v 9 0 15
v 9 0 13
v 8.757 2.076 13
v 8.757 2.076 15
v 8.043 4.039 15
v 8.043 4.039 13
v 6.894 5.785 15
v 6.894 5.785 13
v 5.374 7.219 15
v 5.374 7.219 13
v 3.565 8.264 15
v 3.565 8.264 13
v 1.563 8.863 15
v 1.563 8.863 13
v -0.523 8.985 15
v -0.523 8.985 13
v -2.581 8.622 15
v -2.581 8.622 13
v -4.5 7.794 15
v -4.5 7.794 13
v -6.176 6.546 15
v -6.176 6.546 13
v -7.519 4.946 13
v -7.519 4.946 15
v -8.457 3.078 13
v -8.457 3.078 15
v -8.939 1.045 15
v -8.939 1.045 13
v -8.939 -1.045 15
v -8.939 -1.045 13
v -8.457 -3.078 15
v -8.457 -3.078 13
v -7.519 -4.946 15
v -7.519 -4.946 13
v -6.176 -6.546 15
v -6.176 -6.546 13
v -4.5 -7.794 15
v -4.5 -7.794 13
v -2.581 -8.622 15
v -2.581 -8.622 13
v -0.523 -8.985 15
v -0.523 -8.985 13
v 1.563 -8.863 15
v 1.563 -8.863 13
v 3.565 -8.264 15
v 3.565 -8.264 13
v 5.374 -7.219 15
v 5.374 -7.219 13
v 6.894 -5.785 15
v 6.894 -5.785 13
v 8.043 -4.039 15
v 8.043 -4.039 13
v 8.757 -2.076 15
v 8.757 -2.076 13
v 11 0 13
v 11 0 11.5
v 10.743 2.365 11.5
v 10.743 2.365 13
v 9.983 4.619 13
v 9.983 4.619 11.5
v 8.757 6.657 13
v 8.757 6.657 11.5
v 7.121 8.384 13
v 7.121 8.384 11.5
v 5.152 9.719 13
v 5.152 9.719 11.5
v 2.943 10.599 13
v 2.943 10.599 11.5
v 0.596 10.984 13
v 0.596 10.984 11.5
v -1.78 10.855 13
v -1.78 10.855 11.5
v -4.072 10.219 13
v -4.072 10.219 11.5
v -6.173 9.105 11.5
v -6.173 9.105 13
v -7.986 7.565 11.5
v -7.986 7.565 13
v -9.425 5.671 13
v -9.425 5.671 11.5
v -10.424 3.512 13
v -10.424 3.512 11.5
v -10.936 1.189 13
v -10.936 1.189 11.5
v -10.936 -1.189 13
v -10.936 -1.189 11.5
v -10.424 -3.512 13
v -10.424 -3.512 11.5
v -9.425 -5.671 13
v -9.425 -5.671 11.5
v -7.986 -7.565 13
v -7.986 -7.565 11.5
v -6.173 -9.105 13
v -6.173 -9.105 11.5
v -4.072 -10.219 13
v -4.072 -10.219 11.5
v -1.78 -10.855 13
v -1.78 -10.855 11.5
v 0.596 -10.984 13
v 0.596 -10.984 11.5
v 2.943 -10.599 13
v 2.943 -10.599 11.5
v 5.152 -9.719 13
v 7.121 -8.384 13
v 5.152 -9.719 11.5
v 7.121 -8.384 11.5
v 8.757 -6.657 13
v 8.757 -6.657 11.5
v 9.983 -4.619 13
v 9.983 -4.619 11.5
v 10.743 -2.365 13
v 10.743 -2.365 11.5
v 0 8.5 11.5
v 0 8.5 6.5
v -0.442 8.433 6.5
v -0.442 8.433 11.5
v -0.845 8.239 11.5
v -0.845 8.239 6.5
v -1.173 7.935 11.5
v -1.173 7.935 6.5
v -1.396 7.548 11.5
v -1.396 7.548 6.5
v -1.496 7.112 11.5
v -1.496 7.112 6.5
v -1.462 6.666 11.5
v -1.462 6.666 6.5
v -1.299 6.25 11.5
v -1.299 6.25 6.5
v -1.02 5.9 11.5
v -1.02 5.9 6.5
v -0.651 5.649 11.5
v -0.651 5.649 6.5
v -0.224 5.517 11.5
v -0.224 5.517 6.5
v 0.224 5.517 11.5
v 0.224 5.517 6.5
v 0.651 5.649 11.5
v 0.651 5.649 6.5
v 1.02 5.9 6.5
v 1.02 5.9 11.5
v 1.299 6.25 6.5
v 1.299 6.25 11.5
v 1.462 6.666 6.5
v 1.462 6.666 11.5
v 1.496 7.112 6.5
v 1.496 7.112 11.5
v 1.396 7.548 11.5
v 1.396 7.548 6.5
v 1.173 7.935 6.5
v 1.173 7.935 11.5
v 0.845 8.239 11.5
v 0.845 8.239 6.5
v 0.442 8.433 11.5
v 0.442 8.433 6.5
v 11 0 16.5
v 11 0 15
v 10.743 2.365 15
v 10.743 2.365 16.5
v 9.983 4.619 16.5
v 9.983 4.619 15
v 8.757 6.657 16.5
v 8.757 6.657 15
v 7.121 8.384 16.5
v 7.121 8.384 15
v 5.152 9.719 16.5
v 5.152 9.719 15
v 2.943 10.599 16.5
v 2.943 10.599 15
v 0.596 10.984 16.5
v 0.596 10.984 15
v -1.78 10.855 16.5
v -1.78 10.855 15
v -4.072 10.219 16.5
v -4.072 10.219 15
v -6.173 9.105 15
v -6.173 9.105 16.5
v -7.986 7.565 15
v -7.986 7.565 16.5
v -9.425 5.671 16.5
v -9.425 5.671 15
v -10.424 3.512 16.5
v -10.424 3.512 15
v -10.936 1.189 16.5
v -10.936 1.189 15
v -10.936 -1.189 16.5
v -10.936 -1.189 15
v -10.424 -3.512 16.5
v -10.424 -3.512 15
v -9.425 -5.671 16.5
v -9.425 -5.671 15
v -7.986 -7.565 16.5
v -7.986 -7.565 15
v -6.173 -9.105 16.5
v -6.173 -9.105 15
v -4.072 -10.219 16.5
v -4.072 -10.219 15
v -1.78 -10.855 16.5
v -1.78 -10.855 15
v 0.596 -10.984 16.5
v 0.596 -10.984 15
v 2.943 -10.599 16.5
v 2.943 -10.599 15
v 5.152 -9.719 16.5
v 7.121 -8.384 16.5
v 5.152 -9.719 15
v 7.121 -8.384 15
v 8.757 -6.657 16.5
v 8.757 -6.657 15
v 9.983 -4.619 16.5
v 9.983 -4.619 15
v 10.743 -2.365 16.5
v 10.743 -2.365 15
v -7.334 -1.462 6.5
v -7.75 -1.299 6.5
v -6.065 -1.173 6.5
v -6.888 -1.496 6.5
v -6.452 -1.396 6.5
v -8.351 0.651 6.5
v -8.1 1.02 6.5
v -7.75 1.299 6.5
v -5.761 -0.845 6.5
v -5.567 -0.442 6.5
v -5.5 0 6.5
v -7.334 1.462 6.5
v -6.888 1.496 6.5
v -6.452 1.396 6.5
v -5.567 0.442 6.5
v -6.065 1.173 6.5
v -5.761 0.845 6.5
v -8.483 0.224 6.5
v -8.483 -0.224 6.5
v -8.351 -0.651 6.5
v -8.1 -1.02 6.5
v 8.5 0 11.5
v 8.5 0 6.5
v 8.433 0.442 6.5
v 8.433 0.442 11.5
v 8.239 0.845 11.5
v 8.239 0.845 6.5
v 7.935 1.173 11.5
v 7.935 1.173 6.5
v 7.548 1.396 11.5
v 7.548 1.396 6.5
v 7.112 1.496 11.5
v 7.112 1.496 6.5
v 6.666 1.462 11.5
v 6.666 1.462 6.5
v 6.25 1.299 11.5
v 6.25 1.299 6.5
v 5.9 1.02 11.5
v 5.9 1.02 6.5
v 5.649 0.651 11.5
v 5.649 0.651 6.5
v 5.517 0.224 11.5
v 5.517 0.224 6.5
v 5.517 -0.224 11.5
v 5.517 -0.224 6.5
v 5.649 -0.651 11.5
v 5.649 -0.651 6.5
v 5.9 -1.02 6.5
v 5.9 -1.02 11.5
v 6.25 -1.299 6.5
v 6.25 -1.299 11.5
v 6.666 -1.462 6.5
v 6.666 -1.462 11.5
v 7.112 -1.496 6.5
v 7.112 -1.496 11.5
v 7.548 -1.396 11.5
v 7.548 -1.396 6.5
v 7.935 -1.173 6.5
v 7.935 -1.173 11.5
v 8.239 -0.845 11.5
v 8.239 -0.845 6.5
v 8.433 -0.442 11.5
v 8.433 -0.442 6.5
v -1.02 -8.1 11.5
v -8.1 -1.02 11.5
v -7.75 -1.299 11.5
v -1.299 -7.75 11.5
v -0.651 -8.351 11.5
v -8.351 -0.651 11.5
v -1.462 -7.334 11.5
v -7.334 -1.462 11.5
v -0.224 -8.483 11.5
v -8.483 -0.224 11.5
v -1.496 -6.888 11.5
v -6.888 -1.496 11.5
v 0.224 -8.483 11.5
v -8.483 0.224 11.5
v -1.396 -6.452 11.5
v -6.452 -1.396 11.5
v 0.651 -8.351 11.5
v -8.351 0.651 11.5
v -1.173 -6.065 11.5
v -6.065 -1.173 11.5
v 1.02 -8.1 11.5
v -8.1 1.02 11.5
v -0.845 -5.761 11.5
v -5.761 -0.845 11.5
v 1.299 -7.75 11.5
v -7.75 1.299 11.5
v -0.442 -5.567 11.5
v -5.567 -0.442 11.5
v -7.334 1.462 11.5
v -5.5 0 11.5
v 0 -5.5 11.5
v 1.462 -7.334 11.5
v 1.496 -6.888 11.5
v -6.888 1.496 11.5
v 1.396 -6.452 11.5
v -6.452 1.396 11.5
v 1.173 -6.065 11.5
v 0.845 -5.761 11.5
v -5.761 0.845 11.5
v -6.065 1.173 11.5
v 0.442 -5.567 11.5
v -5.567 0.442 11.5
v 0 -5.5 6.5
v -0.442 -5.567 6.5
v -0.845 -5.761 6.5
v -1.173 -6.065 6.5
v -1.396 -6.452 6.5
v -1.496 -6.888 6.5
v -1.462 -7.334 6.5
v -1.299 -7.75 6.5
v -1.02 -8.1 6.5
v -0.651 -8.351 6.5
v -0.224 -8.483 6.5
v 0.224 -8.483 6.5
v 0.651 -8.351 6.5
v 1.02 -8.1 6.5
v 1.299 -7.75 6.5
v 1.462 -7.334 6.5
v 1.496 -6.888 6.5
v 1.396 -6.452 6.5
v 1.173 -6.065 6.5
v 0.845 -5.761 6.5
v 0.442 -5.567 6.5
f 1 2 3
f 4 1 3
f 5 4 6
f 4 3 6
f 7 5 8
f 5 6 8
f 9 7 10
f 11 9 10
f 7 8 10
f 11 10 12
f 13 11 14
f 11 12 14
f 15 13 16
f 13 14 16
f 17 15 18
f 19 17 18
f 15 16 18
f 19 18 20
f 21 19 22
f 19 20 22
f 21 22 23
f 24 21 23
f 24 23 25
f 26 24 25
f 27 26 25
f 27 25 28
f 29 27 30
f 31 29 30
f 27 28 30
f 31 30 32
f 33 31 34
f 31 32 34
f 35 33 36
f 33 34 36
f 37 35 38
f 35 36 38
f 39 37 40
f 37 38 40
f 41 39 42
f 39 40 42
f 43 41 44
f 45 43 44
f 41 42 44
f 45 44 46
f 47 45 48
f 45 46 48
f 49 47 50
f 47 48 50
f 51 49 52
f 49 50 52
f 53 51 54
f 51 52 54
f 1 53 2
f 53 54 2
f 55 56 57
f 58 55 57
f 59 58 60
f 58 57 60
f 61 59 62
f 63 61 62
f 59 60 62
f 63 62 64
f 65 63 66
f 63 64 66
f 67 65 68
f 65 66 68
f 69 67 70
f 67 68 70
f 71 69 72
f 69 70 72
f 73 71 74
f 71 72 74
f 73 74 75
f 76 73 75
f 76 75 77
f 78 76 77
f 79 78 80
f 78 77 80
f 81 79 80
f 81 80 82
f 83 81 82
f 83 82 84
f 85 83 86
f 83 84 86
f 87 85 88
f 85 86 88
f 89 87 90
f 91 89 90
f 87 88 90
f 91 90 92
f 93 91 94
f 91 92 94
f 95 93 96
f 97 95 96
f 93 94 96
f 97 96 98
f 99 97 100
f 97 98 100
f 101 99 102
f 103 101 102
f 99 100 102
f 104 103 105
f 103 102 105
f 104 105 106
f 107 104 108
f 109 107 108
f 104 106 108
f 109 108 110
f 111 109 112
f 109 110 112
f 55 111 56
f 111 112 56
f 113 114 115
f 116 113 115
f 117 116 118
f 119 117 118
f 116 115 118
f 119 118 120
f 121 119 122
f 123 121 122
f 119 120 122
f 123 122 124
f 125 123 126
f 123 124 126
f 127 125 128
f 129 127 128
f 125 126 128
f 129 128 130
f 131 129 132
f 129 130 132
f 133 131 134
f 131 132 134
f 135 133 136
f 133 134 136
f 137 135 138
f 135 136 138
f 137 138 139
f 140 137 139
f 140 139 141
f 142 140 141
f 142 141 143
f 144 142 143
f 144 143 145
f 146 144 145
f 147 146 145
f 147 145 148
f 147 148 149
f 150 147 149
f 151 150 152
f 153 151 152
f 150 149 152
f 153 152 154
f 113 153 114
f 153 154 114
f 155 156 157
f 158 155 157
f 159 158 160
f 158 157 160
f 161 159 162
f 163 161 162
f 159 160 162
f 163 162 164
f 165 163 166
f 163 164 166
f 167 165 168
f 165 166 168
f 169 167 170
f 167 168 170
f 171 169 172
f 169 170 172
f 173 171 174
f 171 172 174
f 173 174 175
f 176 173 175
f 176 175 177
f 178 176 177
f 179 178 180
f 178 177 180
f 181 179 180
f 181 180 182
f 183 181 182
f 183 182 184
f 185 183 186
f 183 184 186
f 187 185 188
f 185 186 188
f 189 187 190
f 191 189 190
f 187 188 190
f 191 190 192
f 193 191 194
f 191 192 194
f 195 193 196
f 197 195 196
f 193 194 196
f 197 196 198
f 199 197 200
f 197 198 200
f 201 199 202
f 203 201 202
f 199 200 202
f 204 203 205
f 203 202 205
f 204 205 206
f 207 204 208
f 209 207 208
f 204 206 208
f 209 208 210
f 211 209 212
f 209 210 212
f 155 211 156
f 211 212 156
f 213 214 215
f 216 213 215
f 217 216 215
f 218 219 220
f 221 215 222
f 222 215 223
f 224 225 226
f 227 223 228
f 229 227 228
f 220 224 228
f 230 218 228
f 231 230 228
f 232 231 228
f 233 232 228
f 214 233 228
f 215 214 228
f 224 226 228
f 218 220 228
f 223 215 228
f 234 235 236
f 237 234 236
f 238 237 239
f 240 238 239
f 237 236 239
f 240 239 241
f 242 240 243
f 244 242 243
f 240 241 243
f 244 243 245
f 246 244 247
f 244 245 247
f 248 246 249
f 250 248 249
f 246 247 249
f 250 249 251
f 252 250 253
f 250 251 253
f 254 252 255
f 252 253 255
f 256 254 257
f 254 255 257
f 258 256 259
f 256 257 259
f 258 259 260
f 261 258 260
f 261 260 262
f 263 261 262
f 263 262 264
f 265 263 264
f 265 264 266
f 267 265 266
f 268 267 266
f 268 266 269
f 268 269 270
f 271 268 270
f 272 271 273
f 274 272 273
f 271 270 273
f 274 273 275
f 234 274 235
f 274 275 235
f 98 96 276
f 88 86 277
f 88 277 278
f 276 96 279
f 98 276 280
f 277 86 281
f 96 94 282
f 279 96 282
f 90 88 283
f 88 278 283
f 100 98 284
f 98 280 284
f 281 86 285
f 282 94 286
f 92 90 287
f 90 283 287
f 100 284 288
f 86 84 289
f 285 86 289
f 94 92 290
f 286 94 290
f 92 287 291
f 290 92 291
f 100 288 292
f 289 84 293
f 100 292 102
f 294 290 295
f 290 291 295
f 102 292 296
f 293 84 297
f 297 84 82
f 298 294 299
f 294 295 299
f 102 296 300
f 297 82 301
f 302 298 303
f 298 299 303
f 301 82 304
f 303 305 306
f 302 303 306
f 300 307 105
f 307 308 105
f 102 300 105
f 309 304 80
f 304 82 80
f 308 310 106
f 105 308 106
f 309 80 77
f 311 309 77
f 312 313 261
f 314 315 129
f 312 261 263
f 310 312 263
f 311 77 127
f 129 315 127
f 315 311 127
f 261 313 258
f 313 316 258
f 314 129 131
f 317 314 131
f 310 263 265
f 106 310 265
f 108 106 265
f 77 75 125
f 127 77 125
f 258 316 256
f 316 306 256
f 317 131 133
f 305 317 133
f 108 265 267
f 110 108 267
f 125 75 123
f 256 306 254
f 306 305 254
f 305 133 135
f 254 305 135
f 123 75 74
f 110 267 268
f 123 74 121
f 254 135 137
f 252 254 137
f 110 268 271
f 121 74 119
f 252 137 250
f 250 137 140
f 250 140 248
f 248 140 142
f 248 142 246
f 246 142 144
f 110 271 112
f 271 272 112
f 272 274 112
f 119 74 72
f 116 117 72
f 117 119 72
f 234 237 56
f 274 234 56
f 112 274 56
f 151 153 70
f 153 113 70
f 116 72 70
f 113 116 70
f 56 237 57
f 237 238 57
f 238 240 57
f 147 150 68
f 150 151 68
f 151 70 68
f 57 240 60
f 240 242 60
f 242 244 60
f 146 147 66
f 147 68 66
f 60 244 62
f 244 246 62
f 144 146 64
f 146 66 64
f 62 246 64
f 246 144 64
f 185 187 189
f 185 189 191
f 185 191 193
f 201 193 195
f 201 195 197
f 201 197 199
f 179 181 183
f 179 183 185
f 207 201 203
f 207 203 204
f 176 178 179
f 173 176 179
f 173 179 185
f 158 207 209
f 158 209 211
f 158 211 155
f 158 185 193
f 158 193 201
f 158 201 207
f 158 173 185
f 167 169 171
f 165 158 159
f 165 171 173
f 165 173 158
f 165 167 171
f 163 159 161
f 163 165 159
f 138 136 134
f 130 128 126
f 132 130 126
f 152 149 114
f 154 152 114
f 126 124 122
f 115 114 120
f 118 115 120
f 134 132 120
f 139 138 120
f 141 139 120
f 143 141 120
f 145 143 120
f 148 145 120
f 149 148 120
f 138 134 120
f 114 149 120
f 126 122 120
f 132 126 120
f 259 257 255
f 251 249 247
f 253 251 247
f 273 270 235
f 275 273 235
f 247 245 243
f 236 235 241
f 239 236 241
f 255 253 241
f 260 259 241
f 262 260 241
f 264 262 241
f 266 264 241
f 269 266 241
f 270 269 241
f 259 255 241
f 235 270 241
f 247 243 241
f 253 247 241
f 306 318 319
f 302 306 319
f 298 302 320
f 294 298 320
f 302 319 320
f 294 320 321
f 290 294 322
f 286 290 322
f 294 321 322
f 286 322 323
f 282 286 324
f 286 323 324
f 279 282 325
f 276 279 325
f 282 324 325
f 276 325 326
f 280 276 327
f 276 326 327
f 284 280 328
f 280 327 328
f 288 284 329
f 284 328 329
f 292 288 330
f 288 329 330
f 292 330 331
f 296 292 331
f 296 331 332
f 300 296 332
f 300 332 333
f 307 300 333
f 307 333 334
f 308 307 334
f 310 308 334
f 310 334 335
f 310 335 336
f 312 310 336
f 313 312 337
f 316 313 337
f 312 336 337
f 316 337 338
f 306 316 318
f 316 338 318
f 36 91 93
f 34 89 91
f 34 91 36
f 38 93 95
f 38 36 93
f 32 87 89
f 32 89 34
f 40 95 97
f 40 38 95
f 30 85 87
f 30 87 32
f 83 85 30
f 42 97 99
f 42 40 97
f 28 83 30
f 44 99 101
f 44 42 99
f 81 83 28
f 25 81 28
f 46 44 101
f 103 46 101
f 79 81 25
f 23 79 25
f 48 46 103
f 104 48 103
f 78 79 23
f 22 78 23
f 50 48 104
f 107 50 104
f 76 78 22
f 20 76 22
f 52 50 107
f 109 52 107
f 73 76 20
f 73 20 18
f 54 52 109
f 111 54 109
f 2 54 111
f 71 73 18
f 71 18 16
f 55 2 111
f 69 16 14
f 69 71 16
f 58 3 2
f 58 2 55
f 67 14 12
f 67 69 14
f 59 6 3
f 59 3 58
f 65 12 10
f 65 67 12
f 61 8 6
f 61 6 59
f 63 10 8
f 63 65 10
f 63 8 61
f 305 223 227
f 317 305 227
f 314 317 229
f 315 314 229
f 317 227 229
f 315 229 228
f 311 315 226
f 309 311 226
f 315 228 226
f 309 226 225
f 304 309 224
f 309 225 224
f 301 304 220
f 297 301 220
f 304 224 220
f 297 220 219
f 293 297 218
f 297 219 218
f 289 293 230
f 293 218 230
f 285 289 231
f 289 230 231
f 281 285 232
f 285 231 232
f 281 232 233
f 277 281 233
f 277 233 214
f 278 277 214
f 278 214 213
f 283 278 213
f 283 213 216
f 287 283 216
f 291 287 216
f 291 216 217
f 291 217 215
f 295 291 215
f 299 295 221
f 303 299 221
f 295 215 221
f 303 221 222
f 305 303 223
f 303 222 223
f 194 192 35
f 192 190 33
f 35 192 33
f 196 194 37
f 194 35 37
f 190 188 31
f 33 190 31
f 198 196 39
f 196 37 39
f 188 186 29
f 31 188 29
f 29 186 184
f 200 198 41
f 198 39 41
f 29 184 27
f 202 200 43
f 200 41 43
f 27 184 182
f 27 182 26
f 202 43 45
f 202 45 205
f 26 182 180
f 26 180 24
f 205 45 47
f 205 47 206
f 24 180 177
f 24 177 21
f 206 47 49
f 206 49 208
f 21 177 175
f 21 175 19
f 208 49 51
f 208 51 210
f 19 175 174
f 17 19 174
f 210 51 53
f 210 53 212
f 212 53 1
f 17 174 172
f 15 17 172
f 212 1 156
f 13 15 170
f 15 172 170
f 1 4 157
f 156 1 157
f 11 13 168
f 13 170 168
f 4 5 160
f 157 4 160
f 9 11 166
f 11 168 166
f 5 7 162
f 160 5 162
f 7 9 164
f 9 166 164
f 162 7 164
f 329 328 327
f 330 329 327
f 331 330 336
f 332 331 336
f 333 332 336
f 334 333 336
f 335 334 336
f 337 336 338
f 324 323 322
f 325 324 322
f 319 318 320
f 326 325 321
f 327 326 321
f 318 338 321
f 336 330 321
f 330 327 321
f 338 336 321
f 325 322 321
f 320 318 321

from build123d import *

# Parameters (mm, degrees)
CYLINDER913_R             = 1.5
CYLINDER913_DEPTH         = 5
CYLINDER914_R             = 1.5
CYLINDER914_DEPTH         = 5
CYLINDER915_R             = 1.5
CYLINDER915_DEPTH         = 5
CYLINDER916_R             = 1.5
CYLINDER916_DEPTH         = 5
FUSION064_PLACEMENT_ANGLE = 90
CYLINDER909_R             = 11
CYLINDER909_DEPTH         = 1.5
CYLINDER910_R             = 11
CYLINDER910_DEPTH         = 1.5
CYLINDER908_R             = 9
CYLINDER908_DEPTH         = 2


with BuildPart() as cylinder913:
    # Cylinder913 → Cylinder913 (new body)
    with BuildSketch(Plane(origin=(7, 0, 0), x_dir=(1, 0, 0), z_dir=(0, 0, 1))):
        Circle(CYLINDER913_R)
    extrude(amount=CYLINDER913_DEPTH)


with BuildPart() as fusion063:
    # Cylinder914 → Cylinder914 (new body)
    with BuildSketch(Plane(origin=(-7, 0, 0), x_dir=(1, 0, 0), z_dir=(0, 0, 1))):
        Circle(CYLINDER914_R)
    extrude(amount=CYLINDER914_DEPTH)

    # Fusion063: union Cylinder913
    add(cylinder913.part)


with BuildPart() as cylinder915:
    # Cylinder915 → Cylinder915 (new body)
    with BuildSketch(Plane(origin=(7, 0, 0), x_dir=(1, 0, 0), z_dir=(0, 0, 1))):
        Circle(CYLINDER915_R)
    extrude(amount=CYLINDER915_DEPTH)


with BuildPart() as fusion065:
    # Cylinder916 → Cylinder916 (new body)
    with BuildSketch(Plane(origin=(-7, 0, 0), x_dir=(1, 0, 0), z_dir=(0, 0, 1))):
        Circle(CYLINDER916_R)
    extrude(amount=CYLINDER916_DEPTH)

    # Fusion064: union Cylinder915
    add(cylinder915.part)


with BuildPart() as fusion065_1:
    # Fusion064 placement: moved
    add(fusion065.part.rotate(Axis((0, 0, 0), (0, 0, 1)), FUSION064_PLACEMENT_ANGLE))

    # Fusion065: union Fusion063
    add(fusion063.part)


with BuildPart() as fusion065_2:
    # Fusion065 placement: moved
    add(fusion065_1.part.moved(Location((0, 0, 8))))


with BuildPart() as cylinder909:
    # Cylinder909 → Cylinder909 (new body)
    with BuildSketch(Plane.XY.offset(15.5)):
        Circle(CYLINDER909_R)
    extrude(amount=CYLINDER909_DEPTH)


with BuildPart() as cylinder910:
    # Cylinder910 → Cylinder910 (new body)
    with BuildSketch(Plane.XY.offset(12)):
        Circle(CYLINDER910_R)
    extrude(amount=CYLINDER910_DEPTH)


with BuildPart() as selector_gear:
    # Cylinder908 → Cylinder908 (new body)
    with BuildSketch(Plane.XY.offset(13.5)):
        Circle(CYLINDER908_R)
    extrude(amount=CYLINDER908_DEPTH)

    # Fusion072: union Cylinder909, Cylinder910
    add(cylinder909.part)
    add(cylinder910.part)


with BuildPart() as selector_gear_1:
    # Fusion072 placement: moved
    add(selector_gear.part.moved(Location((0, 0, 1))))

    # Fusion073: union Fusion065
    add(fusion065_2.part)


with BuildPart() as selector_gear_2:
    # Fusion073 placement: moved
    add(selector_gear_1.part.moved(Location((0, 0, -1.5))))


solid = selector_gear_2.part
